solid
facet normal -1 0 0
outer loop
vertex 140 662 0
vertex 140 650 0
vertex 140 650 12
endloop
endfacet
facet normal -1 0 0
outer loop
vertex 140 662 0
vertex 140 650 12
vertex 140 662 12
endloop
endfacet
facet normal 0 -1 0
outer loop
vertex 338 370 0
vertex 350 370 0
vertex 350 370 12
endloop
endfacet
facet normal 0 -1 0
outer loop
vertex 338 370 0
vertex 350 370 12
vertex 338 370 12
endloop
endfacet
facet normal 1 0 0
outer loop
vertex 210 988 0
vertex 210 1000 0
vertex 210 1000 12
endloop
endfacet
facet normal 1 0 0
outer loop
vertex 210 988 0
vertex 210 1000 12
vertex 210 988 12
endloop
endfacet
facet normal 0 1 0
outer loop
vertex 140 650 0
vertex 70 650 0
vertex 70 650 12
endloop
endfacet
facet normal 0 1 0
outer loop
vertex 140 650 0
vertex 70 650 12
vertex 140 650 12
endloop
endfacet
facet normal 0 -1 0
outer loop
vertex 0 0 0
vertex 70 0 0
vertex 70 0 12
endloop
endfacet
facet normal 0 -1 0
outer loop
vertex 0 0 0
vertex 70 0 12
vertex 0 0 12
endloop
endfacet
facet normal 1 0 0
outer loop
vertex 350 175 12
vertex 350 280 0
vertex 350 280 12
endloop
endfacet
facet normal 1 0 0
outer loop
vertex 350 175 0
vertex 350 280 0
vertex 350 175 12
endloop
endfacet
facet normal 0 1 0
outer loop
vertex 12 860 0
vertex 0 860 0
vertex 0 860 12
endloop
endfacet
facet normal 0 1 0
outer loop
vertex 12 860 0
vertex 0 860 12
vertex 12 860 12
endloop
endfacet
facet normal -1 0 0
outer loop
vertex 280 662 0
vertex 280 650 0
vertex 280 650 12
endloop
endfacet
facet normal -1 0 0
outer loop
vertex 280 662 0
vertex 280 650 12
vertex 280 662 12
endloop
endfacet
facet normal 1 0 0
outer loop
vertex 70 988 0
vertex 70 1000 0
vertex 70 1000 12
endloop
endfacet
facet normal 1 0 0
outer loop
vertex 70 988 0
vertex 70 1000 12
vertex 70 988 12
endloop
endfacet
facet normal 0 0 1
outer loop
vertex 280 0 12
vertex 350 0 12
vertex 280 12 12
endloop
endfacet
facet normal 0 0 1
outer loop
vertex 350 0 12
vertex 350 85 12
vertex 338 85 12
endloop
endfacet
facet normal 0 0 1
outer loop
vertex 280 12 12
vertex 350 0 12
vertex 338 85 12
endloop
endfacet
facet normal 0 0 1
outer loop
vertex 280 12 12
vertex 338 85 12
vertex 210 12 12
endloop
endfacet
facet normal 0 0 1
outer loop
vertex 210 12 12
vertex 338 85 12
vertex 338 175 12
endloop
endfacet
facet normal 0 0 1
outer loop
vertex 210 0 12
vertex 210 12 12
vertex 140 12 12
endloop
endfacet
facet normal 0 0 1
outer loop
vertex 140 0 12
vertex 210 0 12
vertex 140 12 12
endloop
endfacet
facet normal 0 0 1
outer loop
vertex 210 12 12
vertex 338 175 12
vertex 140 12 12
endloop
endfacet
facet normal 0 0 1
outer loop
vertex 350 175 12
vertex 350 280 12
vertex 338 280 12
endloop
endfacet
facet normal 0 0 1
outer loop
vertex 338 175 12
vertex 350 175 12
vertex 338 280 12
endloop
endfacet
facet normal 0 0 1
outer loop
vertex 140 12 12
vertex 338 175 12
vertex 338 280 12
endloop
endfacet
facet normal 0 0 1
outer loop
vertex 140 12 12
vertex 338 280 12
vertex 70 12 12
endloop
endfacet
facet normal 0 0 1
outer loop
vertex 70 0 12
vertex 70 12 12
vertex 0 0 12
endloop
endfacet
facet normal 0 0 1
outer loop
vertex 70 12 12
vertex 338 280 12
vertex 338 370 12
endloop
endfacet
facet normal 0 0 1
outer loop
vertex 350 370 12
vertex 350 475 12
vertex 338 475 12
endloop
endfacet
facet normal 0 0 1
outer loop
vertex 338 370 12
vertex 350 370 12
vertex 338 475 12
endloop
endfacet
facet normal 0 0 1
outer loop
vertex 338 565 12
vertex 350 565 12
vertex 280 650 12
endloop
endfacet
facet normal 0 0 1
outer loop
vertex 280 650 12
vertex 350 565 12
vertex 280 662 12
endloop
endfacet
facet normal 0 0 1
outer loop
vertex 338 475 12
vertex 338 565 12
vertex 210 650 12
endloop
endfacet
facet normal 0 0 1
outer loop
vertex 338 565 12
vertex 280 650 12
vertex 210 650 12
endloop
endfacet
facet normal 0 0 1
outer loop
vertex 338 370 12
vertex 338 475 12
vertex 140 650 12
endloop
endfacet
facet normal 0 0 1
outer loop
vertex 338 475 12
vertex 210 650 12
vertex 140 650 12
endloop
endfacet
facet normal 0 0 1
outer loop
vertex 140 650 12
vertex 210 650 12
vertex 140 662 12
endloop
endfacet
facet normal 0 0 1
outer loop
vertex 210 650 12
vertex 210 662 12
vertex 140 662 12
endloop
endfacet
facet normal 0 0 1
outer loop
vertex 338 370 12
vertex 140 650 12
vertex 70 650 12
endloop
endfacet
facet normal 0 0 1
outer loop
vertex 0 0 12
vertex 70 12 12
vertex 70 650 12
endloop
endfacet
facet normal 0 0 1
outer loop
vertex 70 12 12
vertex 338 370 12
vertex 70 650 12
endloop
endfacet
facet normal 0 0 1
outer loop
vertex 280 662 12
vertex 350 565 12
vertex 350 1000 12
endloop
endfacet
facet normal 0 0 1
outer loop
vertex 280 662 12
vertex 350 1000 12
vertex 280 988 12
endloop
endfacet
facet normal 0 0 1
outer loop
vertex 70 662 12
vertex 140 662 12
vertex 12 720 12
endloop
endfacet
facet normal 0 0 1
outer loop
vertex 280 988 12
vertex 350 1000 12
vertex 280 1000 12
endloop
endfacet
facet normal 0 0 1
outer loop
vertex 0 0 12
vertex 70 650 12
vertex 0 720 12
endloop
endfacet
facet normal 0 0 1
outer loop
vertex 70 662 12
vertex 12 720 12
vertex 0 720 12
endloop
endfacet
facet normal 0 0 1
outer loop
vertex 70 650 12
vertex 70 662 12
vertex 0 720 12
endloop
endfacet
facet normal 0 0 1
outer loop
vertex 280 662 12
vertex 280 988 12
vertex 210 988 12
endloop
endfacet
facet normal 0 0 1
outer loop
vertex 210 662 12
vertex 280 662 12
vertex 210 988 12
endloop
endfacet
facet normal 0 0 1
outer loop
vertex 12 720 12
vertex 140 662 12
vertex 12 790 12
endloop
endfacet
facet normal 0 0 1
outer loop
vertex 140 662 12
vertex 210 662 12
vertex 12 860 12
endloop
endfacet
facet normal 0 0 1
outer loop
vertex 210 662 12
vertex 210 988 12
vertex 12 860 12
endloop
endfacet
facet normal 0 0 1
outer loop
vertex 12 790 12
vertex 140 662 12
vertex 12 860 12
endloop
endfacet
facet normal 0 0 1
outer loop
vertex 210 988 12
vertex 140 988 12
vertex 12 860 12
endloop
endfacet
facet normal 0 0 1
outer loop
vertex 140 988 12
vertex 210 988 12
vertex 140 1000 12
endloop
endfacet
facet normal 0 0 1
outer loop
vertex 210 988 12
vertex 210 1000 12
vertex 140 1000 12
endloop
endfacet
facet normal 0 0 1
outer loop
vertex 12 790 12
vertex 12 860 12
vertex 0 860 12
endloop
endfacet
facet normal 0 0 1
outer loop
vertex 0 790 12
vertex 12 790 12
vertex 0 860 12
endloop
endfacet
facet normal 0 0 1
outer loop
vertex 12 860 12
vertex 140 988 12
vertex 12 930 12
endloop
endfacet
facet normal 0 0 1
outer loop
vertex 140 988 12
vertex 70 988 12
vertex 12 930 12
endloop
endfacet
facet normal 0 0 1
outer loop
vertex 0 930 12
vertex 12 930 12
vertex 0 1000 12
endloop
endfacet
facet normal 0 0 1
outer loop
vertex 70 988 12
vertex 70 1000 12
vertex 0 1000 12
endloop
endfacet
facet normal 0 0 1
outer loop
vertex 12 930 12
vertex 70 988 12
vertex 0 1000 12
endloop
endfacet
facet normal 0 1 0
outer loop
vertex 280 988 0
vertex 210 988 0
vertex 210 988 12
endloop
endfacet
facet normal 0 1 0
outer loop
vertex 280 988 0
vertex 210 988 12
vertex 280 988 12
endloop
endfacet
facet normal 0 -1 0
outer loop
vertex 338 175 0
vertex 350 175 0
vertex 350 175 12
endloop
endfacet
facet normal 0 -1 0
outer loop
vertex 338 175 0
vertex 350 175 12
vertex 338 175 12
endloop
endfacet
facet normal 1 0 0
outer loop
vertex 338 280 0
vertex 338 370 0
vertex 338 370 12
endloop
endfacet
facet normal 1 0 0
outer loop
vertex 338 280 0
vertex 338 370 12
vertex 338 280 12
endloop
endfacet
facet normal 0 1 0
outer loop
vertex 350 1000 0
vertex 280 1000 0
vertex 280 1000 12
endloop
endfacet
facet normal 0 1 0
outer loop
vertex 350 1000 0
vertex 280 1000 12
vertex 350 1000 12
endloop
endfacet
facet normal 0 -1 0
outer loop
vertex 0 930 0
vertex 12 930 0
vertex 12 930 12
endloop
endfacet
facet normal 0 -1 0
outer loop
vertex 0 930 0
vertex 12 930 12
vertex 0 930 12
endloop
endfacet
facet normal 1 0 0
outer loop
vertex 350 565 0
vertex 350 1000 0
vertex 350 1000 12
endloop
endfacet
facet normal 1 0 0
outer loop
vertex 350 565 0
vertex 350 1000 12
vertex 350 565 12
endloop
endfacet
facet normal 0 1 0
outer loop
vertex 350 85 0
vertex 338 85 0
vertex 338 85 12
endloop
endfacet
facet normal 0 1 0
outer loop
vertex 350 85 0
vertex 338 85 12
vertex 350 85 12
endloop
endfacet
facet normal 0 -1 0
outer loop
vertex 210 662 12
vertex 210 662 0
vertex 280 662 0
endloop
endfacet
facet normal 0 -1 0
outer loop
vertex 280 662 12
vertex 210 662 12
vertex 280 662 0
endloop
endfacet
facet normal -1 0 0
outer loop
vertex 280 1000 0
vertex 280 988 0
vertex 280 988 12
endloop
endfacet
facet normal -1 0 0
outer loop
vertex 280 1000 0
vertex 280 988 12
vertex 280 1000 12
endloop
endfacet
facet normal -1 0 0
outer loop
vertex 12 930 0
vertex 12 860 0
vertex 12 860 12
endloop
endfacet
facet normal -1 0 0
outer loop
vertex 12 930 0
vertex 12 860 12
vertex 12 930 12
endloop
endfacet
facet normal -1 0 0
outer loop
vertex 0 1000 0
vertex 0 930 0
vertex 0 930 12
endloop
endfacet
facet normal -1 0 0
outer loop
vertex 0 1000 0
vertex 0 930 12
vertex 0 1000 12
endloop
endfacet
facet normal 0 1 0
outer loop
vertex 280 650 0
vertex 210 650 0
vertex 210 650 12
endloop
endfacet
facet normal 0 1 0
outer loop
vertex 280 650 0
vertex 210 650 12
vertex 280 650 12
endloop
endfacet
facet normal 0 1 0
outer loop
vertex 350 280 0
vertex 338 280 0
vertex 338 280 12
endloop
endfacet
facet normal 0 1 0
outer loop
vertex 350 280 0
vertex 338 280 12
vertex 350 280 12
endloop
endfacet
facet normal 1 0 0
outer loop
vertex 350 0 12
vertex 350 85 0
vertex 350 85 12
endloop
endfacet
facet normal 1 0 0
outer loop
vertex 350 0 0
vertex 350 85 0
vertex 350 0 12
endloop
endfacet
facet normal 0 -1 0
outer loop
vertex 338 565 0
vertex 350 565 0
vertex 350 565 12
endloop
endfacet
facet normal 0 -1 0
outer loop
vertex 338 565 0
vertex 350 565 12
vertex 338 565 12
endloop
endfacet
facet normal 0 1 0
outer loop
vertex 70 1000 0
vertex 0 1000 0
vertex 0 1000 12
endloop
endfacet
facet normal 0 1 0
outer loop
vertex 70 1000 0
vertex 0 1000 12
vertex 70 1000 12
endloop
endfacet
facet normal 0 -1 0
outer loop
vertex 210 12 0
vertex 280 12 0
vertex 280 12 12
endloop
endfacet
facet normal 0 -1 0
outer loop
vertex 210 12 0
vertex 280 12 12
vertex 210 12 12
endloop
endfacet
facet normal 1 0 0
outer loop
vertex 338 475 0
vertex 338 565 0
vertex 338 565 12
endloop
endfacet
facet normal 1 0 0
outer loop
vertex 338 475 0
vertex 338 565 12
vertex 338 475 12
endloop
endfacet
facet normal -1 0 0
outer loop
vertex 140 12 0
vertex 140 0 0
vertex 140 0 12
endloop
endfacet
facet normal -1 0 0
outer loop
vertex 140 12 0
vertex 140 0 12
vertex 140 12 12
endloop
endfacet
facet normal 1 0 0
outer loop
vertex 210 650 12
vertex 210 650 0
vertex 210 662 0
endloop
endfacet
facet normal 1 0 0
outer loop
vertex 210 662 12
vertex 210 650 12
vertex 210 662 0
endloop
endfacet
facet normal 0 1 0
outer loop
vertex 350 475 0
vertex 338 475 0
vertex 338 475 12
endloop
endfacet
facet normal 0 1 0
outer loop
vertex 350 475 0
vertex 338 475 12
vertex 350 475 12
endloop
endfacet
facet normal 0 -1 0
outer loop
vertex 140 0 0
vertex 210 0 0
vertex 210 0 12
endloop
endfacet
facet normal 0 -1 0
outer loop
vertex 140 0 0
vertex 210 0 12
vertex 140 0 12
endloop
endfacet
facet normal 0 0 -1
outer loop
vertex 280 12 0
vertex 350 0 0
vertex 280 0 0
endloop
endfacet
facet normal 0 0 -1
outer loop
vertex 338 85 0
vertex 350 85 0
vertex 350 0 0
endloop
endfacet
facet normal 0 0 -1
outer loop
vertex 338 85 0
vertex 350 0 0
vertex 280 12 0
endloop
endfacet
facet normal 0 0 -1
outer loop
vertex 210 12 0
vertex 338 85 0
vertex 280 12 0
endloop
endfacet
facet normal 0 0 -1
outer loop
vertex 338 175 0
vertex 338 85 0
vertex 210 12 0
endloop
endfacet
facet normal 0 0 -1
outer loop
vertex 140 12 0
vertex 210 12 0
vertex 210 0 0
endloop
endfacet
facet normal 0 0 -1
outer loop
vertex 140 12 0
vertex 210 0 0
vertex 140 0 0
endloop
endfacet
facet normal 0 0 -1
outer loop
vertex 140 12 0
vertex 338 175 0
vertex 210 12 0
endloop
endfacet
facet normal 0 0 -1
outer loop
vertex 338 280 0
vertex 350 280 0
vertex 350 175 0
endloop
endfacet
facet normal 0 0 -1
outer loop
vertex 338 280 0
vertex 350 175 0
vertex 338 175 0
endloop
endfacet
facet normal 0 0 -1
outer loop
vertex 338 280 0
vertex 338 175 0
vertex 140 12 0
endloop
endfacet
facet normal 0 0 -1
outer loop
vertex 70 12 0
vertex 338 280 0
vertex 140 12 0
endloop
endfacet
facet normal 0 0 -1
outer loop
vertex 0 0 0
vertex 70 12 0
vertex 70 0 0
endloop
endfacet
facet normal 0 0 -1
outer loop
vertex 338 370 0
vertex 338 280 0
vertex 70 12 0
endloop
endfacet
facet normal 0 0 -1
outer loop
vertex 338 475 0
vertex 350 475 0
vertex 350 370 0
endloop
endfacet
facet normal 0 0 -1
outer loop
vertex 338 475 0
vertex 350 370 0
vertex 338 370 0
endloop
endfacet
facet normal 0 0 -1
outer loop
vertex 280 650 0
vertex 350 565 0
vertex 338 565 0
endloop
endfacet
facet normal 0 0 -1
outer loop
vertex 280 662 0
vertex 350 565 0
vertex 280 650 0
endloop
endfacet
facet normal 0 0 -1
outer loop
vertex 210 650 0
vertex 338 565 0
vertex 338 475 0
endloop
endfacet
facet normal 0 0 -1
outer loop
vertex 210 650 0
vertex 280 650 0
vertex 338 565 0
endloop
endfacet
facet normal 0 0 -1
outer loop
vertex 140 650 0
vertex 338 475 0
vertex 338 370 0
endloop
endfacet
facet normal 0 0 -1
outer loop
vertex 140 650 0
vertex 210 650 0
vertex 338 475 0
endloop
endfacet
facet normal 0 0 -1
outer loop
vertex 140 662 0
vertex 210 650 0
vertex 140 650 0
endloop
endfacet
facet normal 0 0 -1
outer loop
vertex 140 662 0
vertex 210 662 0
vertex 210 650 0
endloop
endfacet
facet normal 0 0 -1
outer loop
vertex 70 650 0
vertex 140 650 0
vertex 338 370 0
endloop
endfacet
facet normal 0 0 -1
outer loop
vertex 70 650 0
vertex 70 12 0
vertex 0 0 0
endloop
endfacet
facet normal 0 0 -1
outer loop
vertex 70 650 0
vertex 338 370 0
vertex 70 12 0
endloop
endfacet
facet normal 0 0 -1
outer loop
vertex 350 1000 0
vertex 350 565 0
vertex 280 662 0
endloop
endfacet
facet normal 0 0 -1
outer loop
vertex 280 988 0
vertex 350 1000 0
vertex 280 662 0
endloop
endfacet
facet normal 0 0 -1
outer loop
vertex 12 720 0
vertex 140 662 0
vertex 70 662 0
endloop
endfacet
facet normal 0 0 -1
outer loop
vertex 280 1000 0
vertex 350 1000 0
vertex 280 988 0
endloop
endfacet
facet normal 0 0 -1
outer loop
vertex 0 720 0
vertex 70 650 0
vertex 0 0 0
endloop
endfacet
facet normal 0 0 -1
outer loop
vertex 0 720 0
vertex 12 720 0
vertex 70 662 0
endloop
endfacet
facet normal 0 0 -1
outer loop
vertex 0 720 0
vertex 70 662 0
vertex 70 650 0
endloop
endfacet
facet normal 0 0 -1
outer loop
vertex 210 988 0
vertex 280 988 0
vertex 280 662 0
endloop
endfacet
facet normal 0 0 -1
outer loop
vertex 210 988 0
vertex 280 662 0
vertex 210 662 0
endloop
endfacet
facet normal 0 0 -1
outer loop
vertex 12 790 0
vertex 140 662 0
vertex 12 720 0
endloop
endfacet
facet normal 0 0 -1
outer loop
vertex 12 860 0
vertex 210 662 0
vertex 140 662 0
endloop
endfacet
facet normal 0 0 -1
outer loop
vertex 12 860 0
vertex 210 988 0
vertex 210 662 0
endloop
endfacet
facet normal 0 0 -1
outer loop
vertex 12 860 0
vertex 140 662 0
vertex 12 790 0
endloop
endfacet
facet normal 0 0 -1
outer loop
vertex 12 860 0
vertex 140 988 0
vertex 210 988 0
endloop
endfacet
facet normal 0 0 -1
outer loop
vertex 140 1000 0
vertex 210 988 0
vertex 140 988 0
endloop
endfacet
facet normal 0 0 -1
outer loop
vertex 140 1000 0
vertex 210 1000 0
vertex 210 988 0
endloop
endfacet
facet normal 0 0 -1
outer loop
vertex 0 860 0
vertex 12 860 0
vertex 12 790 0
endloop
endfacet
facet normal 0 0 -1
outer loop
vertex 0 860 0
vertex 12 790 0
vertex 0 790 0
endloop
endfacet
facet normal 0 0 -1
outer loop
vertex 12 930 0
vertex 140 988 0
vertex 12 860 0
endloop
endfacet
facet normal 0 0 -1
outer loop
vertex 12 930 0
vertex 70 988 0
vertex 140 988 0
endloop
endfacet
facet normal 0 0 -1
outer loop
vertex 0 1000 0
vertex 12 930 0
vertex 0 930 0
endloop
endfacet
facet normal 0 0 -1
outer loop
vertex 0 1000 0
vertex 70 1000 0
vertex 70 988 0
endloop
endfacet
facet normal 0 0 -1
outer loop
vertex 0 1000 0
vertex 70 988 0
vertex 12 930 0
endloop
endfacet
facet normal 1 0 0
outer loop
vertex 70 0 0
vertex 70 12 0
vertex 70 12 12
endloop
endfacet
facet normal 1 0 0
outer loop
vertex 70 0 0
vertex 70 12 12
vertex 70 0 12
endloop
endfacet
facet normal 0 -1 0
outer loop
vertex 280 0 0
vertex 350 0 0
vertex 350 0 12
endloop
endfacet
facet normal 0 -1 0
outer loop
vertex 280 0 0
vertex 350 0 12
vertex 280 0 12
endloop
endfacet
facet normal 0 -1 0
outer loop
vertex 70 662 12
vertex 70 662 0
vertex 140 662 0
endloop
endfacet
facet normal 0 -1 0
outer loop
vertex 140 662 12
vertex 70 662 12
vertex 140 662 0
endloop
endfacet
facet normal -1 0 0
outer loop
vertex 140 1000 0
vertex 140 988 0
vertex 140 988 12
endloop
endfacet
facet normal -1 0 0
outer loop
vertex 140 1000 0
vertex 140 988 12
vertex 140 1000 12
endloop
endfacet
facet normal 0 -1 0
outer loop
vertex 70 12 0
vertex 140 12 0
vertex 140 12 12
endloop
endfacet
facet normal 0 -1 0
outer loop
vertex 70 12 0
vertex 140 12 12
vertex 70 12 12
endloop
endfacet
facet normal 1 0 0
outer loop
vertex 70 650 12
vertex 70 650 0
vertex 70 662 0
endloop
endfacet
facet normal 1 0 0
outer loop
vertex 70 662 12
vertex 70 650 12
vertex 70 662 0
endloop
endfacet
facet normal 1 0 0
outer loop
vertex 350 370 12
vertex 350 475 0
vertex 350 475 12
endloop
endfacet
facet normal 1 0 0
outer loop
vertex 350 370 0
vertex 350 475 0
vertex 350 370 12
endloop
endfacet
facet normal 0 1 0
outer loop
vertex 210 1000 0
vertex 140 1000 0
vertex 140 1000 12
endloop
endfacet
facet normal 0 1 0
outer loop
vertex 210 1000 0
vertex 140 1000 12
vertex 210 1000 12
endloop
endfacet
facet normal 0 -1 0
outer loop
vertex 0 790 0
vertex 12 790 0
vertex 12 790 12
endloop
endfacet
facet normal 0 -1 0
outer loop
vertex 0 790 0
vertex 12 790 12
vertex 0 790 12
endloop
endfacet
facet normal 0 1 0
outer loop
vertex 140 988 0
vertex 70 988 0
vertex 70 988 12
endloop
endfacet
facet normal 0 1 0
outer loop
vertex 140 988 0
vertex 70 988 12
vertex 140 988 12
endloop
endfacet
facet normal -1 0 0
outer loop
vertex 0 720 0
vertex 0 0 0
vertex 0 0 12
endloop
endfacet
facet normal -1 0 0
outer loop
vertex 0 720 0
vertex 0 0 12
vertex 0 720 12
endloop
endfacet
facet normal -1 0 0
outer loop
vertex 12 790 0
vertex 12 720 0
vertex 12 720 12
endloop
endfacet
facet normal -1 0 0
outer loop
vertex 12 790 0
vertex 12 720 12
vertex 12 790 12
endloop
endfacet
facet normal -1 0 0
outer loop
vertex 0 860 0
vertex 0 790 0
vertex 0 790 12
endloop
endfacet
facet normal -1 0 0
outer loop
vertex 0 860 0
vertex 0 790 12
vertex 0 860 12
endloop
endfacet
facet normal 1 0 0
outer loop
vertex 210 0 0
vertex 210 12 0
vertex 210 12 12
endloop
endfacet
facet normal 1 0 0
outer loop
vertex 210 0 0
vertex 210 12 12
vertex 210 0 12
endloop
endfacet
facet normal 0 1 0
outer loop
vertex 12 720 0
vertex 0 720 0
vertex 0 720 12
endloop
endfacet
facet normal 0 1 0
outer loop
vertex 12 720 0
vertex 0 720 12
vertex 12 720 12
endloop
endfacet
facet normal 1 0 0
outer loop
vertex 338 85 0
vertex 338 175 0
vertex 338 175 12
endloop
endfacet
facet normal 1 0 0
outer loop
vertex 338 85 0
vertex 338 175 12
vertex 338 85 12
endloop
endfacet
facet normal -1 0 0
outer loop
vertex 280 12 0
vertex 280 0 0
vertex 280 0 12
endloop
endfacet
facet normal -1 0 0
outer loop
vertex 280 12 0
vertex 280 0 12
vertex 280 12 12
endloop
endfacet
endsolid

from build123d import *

# Parameters (mm, degrees)
SKETCH1_W           = 70
SKETCH1_H           = 12
BOSS_EXTRUDE2_DEPTH = 12


with BuildPart() as part:
    # Sketch1 → Boss-Extrude2 (new body)
    with BuildSketch(Plane.XY):
        Polygon((280, 1000), (350, 1000), (350, 565), (338, 565), (338, 475), (350, 475), (350, 370), (338, 370), (338, 280), (350, 280), (350, 175), (338, 175), (338, 85), (350, 85), (350, 0), (280, 0), (280, 12), (210, 12), (210, 0), (140, 0), (140, 12), (70, 12), (70, 0), (0, 0), (0, 720), (12, 720), (12, 790), (0, 790), (0, 860), (12, 860), (12, 930), (0, 930), (0, 1000), (70, 1000), (70, 988), (140, 988), (140, 1000), (210, 1000), (210, 988), (280, 988), align=None)
        with Locations((105, 656)):
            Rectangle(SKETCH1_W, SKETCH1_H, mode=Mode.SUBTRACT)
        with Locations((245, 656)):
            Rectangle(SKETCH1_W, SKETCH1_H, mode=Mode.SUBTRACT)
    extrude(amount=BOSS_EXTRUDE2_DEPTH)


solid = part.part
